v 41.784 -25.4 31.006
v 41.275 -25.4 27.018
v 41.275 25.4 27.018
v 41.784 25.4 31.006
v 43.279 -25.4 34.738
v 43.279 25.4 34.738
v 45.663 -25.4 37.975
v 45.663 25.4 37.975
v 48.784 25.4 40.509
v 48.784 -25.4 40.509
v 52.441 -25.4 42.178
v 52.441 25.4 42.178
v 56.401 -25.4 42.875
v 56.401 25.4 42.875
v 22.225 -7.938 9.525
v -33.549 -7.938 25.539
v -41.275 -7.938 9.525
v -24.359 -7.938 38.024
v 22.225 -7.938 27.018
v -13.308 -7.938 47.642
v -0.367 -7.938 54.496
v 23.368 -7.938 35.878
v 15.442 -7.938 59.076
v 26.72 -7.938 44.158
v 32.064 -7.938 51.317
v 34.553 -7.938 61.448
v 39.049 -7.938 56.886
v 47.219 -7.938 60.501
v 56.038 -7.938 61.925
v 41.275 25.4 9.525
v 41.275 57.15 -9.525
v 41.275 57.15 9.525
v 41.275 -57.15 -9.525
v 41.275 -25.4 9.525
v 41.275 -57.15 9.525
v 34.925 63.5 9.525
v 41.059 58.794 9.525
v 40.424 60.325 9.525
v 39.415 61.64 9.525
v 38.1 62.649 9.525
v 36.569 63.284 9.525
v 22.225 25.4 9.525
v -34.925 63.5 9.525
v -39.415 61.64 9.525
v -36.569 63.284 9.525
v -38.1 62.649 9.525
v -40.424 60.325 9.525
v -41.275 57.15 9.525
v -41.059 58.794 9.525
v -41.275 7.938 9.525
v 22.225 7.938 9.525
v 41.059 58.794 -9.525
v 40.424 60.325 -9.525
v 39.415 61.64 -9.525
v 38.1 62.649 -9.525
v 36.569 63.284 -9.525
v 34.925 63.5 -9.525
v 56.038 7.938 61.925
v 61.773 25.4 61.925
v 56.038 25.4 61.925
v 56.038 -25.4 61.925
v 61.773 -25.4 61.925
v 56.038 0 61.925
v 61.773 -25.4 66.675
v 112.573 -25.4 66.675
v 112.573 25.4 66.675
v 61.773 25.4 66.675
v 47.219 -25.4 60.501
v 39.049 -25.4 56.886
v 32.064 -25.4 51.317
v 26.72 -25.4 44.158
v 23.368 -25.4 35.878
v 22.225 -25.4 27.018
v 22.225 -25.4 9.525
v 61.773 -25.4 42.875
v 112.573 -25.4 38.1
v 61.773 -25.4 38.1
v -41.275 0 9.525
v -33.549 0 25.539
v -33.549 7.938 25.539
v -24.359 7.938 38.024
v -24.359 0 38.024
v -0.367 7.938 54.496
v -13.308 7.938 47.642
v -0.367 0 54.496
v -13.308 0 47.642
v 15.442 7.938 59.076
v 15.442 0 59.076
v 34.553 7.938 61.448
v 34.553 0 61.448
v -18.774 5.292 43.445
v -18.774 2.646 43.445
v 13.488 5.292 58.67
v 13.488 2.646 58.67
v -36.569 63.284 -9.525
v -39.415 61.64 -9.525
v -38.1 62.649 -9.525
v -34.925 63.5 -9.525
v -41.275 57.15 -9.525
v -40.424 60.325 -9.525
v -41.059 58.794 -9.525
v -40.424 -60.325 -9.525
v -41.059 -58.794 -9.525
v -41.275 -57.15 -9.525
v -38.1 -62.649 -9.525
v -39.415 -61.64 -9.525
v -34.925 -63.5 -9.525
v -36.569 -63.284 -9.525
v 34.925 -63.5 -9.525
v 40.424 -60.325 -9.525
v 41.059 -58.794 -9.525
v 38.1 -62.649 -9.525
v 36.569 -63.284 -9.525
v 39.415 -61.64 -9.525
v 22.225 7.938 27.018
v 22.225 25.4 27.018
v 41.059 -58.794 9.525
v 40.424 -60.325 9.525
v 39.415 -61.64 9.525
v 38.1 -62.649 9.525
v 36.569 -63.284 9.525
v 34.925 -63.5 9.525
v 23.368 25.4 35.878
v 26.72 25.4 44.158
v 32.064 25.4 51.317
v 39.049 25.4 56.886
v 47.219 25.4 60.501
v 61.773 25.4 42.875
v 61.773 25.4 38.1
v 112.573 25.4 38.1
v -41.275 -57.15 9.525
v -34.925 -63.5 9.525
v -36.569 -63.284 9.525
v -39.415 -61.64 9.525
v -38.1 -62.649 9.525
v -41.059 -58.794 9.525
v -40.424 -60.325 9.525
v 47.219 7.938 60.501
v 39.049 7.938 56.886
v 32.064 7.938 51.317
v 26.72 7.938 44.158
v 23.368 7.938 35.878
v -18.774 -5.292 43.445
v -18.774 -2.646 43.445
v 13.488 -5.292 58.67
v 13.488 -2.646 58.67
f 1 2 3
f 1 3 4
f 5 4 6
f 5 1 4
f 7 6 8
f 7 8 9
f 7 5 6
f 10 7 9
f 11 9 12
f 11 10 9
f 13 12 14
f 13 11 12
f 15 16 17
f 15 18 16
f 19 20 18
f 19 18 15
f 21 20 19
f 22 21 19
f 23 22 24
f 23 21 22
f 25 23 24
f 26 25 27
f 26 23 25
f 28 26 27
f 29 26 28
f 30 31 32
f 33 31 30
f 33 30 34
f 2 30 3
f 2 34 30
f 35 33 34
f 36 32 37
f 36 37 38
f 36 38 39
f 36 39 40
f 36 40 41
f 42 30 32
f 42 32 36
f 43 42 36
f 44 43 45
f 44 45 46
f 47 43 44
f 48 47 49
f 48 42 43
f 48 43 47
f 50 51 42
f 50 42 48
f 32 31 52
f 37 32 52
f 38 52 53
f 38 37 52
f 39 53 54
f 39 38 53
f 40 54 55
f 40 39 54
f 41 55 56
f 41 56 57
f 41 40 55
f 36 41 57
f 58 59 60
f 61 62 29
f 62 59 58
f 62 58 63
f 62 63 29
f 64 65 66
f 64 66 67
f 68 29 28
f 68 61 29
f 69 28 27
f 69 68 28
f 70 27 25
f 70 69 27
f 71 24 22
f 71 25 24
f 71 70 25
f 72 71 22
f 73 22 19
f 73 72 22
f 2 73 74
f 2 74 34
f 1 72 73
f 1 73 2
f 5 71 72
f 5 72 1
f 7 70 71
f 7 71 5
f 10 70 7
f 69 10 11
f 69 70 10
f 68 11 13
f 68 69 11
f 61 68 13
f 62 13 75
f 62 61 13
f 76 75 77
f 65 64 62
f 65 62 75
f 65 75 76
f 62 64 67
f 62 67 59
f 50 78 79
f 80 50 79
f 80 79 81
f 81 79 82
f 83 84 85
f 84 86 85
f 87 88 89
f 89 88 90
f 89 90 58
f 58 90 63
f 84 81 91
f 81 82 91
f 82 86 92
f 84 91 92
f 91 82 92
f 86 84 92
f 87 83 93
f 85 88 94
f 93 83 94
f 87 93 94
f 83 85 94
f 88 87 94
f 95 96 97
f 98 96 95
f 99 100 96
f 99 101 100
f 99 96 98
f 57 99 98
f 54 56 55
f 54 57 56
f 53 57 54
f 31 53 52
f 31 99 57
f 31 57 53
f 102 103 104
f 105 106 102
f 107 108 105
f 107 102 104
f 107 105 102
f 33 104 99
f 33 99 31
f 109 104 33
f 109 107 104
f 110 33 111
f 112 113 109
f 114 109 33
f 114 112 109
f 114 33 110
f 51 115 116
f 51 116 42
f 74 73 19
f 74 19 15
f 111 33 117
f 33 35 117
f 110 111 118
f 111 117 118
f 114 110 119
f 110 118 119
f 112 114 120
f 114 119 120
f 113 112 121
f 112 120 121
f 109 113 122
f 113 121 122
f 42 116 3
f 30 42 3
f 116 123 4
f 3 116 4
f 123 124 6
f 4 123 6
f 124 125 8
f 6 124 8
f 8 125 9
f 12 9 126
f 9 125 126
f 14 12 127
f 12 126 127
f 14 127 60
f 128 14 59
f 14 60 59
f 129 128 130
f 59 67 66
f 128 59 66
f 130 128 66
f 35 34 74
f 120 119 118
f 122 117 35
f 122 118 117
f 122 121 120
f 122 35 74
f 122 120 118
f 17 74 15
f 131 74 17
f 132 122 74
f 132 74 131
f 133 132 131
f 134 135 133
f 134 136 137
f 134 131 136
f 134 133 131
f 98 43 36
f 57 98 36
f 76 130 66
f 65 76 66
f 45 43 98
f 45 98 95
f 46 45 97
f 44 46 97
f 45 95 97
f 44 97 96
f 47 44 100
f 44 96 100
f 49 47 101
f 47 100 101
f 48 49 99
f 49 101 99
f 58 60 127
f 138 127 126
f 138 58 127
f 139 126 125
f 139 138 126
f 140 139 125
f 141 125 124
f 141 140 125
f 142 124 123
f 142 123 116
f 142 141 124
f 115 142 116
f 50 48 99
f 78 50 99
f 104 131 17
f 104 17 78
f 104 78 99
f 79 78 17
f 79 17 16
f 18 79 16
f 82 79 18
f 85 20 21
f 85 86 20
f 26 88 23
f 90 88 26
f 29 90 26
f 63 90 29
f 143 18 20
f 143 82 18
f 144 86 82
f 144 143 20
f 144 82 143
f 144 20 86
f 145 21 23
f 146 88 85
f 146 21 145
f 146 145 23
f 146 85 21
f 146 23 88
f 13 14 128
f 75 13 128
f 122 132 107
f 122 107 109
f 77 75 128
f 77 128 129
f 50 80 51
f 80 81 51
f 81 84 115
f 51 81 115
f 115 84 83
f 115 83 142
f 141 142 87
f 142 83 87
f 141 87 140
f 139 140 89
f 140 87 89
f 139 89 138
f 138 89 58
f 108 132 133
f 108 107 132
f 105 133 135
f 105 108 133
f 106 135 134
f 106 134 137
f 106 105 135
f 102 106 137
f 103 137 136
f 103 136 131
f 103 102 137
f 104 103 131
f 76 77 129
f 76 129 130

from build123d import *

# Parameters (mm, degrees)
F1_DEPTH = 63.5
F0_W     = 11.7803301271
F0_H     = 19.05
F2_DEPTH = 25.4
F3_DEPTH = 7.9375
F4_R     = 6.35


with BuildPart() as f1:
    # F0 (on Front) → F1 (new body, symmetric)
    with BuildSketch(Plane.XZ):
        Polygon((41.275, -9.525), (41.275, 9.525), (22.225, 9.525), (-41.275, 9.525), (-41.275, -9.525), align=None)
    extrude(amount=F1_DEPTH, both=True)

    # F0 (on Front) → F2 (join, symmetric)
    with BuildSketch(Plane.XZ):
        with BuildLine():
            Line((22.225, 9.525), (41.275, 9.525))
            Line((41.275, 9.525), (41.275, 27.0178999029))
            ThreePointArc((41.275, 27.0178999029), (45.6627686716, 37.9750501441), (56.4005611221, 42.8752))
            Line((56.4005611221, 42.8752), (61.7728, 42.8752))
            Line((61.7728, 42.8752), (61.7728, 61.9252))
            Line((61.7728, 61.9252), (56.0382334177, 61.9252))
            ThreePointArc((56.0382334177, 61.9252), (32.0643061399, 51.3173564515), (22.225, 27.0178999029))
            Line((22.225, 27.0178999029), (22.225, 9.525))
        make_face()
        Polygon((87.1728, 52.3875), (87.1728, 38.1), (112.5728, 38.1), (112.5728, 66.675), (87.1728, 66.675), align=None)
        Polygon((73.5531301271, 42.8752), (61.7728, 42.8752), (61.7728, 38.1), (87.1728, 38.1), (87.1728, 52.3875), (87.1728, 66.675), (61.7728, 66.675), (61.7728, 61.9252), (73.5531301271, 61.9252), align=None)
        with Locations((67.6629650635, 52.4002)):
            Rectangle(F0_W, F0_H)
    extrude(amount=F2_DEPTH, both=True)

    # F0 (on Front) → F3 (join, symmetric)
    with BuildSketch(Plane.XZ):
        with BuildLine():
            Line((-41.275, 9.525), (22.225, 9.525))
            Line((22.225, 9.525), (22.225, 27.0178999029))
            ThreePointArc((22.225, 27.0178999029), (32.0643061399, 51.3173564515), (56.0382334177, 61.9252))
            add(Edge.make_bspline(
                [(-41.275, 9.525), (-23.4800241888, 55.0344586372), (8.1693455577, 62.4129325151), (56.0382334177, 61.9252)],
                knots=[0, 0, 0, 0, 110.5244152133, 110.5244152133, 110.5244152133, 110.5244152133], degree=3))
        make_face()
    extrude(amount=F3_DEPTH, both=True)

    # F4
    f4_edges = [f1.edges().sort_by_distance(p)[0] for p in [
        (41.275, -63.5, 0),
        (41.275, 63.5, 0),
        (-41.275, -63.5, 0),
        (-41.275, 63.5, 0),
    ]]
    fillet(f4_edges, radius=F4_R)


solid = f1.part
